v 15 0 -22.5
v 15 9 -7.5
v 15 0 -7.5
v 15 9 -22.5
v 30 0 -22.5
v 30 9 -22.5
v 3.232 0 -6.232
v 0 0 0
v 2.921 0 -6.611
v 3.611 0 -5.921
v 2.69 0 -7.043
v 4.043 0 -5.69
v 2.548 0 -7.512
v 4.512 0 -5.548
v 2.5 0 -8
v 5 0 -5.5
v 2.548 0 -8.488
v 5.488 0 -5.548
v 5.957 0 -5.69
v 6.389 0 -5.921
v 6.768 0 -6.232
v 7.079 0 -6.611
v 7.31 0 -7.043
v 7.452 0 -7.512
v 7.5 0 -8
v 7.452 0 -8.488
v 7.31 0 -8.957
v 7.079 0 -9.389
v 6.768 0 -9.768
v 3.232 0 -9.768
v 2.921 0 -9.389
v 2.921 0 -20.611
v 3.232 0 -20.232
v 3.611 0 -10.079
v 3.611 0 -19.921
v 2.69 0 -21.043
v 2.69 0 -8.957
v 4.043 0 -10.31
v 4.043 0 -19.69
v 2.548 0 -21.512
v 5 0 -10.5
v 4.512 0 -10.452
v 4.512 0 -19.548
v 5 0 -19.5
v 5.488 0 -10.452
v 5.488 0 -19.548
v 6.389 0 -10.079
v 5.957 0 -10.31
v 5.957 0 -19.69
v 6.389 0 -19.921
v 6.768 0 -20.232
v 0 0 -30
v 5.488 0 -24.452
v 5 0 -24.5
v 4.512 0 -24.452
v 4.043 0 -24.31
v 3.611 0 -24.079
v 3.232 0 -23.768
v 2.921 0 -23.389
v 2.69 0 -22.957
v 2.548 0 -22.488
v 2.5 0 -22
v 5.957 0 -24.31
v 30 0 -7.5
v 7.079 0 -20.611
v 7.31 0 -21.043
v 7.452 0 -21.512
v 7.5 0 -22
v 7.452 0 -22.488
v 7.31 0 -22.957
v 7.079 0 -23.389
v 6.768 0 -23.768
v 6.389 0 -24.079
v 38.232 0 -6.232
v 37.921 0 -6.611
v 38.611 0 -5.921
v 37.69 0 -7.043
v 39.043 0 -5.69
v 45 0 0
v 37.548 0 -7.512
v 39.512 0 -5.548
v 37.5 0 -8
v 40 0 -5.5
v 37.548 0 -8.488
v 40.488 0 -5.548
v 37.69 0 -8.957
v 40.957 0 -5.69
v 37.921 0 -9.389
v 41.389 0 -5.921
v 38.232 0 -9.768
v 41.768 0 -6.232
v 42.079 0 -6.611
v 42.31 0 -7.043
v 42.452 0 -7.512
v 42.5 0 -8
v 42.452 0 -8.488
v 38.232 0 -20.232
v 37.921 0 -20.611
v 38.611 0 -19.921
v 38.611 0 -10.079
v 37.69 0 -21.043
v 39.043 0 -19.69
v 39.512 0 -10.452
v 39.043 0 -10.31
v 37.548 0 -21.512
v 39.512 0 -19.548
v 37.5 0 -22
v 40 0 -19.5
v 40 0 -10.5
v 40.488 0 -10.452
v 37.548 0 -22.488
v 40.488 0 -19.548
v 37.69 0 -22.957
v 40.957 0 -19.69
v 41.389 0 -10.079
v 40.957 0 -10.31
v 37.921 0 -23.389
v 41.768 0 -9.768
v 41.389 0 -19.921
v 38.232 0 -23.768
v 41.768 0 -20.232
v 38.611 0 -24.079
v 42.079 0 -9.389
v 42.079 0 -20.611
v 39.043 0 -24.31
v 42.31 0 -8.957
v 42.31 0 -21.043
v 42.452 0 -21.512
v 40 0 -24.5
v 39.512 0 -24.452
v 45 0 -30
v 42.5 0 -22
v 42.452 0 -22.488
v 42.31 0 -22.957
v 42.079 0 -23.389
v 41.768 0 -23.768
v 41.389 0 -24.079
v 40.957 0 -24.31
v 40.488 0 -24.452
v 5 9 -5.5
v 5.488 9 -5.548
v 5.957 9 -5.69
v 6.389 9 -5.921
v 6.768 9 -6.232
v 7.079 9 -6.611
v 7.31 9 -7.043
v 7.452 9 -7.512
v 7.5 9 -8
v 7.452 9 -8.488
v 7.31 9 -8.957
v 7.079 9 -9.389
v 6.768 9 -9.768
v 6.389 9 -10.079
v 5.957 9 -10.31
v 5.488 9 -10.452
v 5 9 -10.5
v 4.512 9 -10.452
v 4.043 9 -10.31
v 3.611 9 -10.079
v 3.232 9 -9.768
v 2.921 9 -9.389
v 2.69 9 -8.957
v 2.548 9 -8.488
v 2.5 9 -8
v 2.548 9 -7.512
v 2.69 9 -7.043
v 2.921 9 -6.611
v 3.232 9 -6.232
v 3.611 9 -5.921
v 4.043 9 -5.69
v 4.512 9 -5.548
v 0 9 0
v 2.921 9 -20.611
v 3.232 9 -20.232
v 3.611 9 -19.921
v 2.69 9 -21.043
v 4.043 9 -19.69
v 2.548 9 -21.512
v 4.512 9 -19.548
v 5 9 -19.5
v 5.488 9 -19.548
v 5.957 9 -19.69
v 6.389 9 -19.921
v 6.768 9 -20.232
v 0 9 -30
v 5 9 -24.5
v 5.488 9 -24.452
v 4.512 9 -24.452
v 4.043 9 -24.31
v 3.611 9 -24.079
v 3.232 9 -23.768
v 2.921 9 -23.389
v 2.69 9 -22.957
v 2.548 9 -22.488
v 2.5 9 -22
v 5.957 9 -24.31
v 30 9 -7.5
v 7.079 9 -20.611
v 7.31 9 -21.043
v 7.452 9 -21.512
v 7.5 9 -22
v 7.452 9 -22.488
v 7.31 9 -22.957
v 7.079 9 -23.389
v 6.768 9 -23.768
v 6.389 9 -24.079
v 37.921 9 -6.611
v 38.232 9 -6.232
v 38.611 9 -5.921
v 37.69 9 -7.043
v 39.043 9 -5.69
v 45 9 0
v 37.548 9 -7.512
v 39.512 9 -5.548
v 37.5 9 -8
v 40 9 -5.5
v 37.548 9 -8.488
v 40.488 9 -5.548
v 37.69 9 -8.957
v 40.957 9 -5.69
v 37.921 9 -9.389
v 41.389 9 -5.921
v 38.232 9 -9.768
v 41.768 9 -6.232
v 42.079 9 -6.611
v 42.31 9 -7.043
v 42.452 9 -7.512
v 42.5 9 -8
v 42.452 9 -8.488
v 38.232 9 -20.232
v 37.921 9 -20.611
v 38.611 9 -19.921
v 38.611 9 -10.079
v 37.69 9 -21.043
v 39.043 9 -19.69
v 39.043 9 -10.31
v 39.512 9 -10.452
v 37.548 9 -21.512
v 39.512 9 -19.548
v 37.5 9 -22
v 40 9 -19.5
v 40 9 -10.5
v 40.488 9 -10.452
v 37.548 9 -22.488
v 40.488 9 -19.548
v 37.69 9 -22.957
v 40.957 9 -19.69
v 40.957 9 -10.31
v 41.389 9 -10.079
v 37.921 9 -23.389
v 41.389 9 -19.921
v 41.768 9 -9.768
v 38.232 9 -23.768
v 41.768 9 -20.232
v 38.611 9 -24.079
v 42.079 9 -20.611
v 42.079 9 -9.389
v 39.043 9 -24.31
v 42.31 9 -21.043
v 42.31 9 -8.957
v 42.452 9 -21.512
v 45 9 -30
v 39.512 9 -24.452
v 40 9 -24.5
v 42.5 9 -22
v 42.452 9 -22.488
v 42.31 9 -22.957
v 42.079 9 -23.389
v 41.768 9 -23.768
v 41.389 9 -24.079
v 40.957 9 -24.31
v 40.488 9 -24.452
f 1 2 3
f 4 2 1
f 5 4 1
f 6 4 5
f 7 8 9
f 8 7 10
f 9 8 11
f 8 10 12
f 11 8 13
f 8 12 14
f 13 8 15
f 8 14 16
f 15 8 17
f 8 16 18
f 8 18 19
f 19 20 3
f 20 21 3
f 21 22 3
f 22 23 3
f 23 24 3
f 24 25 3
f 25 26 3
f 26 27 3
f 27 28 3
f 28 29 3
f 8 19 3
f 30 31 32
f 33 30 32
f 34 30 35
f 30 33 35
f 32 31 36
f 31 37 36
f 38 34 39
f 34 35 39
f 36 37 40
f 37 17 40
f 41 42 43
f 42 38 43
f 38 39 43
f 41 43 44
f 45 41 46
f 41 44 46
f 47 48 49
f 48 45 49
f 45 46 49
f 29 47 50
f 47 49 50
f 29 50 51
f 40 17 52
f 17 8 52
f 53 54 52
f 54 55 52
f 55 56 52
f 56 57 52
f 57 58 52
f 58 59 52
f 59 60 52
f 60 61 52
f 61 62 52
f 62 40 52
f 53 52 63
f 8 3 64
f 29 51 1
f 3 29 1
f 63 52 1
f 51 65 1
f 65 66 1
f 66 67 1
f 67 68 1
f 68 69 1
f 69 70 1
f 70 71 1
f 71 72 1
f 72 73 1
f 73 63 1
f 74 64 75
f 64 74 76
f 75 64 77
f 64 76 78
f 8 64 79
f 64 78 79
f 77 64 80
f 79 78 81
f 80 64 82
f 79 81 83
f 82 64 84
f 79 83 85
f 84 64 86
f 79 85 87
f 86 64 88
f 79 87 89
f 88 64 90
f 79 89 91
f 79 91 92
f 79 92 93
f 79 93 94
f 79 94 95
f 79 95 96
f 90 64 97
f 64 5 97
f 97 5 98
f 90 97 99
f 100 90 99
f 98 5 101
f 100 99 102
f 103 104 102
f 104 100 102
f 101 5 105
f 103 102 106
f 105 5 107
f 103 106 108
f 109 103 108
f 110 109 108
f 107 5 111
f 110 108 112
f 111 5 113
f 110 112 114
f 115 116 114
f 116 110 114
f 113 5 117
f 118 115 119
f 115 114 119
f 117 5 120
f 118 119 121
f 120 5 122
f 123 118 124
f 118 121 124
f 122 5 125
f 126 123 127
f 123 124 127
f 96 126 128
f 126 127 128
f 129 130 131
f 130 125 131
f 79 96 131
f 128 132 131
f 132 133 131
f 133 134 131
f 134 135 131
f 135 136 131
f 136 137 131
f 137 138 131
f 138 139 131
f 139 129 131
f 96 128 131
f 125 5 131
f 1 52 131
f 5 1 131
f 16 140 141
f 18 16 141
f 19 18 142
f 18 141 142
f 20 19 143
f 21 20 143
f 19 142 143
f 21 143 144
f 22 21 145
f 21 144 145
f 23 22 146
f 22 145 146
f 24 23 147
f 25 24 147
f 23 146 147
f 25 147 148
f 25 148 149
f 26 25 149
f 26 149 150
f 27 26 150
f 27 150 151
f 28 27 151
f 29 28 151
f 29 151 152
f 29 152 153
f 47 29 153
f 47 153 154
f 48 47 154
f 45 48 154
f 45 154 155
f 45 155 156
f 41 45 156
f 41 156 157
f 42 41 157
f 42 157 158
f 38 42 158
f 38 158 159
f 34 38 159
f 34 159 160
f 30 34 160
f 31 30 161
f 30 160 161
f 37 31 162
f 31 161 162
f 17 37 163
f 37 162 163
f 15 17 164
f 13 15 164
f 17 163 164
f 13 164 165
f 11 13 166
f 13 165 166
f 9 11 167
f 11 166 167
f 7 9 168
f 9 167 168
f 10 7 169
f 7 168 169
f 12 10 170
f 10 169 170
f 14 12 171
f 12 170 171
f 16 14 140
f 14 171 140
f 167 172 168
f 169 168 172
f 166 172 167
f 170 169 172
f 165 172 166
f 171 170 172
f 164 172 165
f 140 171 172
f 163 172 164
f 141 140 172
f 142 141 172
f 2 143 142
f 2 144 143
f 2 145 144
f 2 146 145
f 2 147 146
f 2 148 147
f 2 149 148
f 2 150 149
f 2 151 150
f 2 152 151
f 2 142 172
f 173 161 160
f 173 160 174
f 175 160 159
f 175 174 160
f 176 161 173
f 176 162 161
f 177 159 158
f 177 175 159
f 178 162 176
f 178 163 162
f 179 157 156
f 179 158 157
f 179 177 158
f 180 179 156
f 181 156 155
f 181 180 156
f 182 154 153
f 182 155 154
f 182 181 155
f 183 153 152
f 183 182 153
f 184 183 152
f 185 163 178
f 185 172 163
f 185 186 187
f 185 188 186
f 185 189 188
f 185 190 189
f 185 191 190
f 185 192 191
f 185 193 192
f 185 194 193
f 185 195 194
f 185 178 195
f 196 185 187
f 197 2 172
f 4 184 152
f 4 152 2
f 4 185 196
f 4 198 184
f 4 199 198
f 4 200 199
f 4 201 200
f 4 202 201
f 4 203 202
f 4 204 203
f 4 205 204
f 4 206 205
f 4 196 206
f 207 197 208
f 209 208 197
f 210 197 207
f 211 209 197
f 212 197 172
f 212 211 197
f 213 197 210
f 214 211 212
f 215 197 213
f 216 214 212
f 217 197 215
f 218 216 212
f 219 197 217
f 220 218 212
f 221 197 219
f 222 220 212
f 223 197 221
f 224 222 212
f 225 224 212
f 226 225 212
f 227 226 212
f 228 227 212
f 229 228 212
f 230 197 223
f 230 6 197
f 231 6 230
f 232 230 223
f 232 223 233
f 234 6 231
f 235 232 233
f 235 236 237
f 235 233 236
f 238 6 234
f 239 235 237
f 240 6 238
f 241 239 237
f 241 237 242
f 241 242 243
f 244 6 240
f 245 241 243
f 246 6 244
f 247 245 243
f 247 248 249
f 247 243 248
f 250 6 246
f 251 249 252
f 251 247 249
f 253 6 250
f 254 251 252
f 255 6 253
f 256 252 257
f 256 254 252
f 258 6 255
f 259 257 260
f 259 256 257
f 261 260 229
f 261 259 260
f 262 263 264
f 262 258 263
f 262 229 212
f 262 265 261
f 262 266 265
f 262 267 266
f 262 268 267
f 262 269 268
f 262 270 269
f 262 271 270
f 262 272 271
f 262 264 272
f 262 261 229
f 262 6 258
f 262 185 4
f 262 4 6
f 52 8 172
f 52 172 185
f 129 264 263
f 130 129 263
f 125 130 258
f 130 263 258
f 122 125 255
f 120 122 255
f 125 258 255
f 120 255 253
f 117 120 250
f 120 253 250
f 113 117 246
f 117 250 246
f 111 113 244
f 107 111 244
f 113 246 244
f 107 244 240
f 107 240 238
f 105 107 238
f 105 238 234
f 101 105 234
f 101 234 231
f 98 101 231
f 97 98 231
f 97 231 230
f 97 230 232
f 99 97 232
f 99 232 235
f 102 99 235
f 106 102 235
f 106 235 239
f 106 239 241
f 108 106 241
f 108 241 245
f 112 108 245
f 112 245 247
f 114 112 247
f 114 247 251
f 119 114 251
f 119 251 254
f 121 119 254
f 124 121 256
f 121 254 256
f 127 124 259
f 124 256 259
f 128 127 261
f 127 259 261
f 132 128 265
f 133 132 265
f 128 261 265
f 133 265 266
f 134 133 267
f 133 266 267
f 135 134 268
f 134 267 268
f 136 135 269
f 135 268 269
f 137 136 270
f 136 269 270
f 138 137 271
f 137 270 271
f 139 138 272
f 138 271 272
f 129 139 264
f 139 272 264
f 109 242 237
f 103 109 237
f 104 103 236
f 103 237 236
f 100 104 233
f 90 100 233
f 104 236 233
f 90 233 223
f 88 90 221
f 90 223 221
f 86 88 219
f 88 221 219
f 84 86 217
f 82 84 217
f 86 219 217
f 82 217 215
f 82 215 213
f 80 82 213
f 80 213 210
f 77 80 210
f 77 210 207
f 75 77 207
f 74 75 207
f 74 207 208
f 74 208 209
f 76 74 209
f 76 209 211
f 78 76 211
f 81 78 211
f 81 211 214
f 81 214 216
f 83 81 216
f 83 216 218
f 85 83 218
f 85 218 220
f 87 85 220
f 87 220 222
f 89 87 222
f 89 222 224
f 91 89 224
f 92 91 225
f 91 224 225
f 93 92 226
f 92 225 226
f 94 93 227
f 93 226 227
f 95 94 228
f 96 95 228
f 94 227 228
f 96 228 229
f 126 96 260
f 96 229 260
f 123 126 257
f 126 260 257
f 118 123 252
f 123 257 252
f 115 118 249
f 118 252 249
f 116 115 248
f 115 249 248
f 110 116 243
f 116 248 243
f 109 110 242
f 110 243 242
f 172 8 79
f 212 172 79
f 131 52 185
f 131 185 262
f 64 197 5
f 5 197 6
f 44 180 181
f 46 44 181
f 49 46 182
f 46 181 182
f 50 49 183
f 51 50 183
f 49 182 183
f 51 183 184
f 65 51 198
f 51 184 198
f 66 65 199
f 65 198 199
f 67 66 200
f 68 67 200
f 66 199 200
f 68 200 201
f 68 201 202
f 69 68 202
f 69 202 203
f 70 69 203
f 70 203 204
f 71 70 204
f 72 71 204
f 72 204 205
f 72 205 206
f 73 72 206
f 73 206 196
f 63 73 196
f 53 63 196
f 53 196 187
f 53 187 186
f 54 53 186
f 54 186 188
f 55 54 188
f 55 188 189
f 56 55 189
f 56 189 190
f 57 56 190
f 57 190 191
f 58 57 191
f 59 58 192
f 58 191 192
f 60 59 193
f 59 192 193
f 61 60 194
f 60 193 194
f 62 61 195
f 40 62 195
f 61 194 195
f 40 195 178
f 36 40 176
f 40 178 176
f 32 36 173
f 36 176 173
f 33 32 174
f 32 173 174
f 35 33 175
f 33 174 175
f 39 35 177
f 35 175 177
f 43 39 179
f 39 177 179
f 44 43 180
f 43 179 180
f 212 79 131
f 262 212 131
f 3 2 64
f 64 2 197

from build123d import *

# Parameters (mm, degrees)
CROQUIS1_W              = 45
CROQUIS1_H              = 30
SALIENTE_EXTRUIR1_DEPTH = 9
CROQUIS2_R              = 2.5
CROQUIS2_W              = 15
CROQUIS2_H              = 15
CORTAR_EXTRUIR1_DEPTH   = 10


with BuildPart() as part:
    # Croquis1 → Saliente-Extruir1 (new body)
    with BuildSketch(Plane(origin=(0, 0, 0), x_dir=(1, 0, 0), z_dir=(0, 1, 0))):
        with Locations((22.5, 15)):
            Rectangle(CROQUIS1_W, CROQUIS1_H)
    extrude(amount=SALIENTE_EXTRUIR1_DEPTH)

    # Croquis2 → Cortar-Extruir1 (cut)
    with BuildSketch(Plane(origin=(0, 9, 0), x_dir=(1, 0, 0), z_dir=(0, 1, 0))):
        with Locations(Location((5, 22, 0), (0, 0, 270))):
            Circle(CROQUIS2_R)
        with Locations(Location((5, 8, 0), (0, 0, 270))):
            Circle(CROQUIS2_R)
        with Locations(Location((40, 8, 0), (0, 0, 90))):
            Circle(CROQUIS2_R)
        with Locations(Location((40, 22, 0), (0, 0, 90))):
            Circle(CROQUIS2_R)
        with Locations((22.5, 15)):
            Rectangle(CROQUIS2_W, CROQUIS2_H)
    extrude(amount=-CORTAR_EXTRUIR1_DEPTH, mode=Mode.SUBTRACT)


solid = part.part
